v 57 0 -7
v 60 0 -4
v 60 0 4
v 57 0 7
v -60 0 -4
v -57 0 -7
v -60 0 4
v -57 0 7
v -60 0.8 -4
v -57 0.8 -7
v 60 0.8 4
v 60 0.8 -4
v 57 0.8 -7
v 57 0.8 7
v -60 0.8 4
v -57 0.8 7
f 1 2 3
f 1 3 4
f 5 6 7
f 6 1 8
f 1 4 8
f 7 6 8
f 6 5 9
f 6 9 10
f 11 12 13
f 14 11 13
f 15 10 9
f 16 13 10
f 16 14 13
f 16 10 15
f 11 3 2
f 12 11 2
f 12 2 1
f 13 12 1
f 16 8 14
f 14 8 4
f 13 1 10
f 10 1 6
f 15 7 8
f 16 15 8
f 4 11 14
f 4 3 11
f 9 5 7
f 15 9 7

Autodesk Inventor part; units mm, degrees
ref_plane "YZ Plane" through (0, 0, 0) normal (1, 0, 0) x (0, 1, 0)
ref_plane "XZ Plane" through (0, 0, 0) normal (0, 1, 0) x (-1, 0, 0)
ref_plane "XY Plane" through (0, 0, 0) normal (0, 0, 1) x (1, 0, 0)
sketch "Sketch1" plane through (0, 0, 0) normal (0, 1, 0) x (-1, 0, 0)
  line L0 (57, 7) -> (-57, 7)
  line L1 (-60, 4) -> (-60, -4)
  line L2 (-57, -7) -> (57, -7)
  line L3 (60, -4) -> (60, 4)
  line L4 (60, 7) -> (-60, -7) construction
  line L5 (-60, 7) -> (60, -7) construction
  line L6 (60, 4) -> (57, 7)
  line L7 (60, -4) -> (57, -7)
  line L8 (-60, 4) -> (-57, 7)
  line L9 (-60, -4) -> (-57, -7)
  point P0 (0, 0)
  dimension "d0" = 120
  dimension "d1" = 14
  dimension "d2" = 3
  dimension "d3" = 3
  dimension "d4" = 3
  dimension "d5" = 3
  dimension "d6" = 3
  dimension "d7" = 3
  dimension "d8" = 3
  dimension "d9" = 3
extrude "Extrusion1" add sketch "Sketch1" along normal blind 0.8
equation "\"d3\" = d2"
equation "\"d4\" = d2"
equation "\"d5\" = d4"
equation "\"d6\" = d2"
equation "\"d7\" = d6"
equation "\"d8\" = d2"
equation "\"d9\" = d8"
properties part number "PCB" material "GFRC"
